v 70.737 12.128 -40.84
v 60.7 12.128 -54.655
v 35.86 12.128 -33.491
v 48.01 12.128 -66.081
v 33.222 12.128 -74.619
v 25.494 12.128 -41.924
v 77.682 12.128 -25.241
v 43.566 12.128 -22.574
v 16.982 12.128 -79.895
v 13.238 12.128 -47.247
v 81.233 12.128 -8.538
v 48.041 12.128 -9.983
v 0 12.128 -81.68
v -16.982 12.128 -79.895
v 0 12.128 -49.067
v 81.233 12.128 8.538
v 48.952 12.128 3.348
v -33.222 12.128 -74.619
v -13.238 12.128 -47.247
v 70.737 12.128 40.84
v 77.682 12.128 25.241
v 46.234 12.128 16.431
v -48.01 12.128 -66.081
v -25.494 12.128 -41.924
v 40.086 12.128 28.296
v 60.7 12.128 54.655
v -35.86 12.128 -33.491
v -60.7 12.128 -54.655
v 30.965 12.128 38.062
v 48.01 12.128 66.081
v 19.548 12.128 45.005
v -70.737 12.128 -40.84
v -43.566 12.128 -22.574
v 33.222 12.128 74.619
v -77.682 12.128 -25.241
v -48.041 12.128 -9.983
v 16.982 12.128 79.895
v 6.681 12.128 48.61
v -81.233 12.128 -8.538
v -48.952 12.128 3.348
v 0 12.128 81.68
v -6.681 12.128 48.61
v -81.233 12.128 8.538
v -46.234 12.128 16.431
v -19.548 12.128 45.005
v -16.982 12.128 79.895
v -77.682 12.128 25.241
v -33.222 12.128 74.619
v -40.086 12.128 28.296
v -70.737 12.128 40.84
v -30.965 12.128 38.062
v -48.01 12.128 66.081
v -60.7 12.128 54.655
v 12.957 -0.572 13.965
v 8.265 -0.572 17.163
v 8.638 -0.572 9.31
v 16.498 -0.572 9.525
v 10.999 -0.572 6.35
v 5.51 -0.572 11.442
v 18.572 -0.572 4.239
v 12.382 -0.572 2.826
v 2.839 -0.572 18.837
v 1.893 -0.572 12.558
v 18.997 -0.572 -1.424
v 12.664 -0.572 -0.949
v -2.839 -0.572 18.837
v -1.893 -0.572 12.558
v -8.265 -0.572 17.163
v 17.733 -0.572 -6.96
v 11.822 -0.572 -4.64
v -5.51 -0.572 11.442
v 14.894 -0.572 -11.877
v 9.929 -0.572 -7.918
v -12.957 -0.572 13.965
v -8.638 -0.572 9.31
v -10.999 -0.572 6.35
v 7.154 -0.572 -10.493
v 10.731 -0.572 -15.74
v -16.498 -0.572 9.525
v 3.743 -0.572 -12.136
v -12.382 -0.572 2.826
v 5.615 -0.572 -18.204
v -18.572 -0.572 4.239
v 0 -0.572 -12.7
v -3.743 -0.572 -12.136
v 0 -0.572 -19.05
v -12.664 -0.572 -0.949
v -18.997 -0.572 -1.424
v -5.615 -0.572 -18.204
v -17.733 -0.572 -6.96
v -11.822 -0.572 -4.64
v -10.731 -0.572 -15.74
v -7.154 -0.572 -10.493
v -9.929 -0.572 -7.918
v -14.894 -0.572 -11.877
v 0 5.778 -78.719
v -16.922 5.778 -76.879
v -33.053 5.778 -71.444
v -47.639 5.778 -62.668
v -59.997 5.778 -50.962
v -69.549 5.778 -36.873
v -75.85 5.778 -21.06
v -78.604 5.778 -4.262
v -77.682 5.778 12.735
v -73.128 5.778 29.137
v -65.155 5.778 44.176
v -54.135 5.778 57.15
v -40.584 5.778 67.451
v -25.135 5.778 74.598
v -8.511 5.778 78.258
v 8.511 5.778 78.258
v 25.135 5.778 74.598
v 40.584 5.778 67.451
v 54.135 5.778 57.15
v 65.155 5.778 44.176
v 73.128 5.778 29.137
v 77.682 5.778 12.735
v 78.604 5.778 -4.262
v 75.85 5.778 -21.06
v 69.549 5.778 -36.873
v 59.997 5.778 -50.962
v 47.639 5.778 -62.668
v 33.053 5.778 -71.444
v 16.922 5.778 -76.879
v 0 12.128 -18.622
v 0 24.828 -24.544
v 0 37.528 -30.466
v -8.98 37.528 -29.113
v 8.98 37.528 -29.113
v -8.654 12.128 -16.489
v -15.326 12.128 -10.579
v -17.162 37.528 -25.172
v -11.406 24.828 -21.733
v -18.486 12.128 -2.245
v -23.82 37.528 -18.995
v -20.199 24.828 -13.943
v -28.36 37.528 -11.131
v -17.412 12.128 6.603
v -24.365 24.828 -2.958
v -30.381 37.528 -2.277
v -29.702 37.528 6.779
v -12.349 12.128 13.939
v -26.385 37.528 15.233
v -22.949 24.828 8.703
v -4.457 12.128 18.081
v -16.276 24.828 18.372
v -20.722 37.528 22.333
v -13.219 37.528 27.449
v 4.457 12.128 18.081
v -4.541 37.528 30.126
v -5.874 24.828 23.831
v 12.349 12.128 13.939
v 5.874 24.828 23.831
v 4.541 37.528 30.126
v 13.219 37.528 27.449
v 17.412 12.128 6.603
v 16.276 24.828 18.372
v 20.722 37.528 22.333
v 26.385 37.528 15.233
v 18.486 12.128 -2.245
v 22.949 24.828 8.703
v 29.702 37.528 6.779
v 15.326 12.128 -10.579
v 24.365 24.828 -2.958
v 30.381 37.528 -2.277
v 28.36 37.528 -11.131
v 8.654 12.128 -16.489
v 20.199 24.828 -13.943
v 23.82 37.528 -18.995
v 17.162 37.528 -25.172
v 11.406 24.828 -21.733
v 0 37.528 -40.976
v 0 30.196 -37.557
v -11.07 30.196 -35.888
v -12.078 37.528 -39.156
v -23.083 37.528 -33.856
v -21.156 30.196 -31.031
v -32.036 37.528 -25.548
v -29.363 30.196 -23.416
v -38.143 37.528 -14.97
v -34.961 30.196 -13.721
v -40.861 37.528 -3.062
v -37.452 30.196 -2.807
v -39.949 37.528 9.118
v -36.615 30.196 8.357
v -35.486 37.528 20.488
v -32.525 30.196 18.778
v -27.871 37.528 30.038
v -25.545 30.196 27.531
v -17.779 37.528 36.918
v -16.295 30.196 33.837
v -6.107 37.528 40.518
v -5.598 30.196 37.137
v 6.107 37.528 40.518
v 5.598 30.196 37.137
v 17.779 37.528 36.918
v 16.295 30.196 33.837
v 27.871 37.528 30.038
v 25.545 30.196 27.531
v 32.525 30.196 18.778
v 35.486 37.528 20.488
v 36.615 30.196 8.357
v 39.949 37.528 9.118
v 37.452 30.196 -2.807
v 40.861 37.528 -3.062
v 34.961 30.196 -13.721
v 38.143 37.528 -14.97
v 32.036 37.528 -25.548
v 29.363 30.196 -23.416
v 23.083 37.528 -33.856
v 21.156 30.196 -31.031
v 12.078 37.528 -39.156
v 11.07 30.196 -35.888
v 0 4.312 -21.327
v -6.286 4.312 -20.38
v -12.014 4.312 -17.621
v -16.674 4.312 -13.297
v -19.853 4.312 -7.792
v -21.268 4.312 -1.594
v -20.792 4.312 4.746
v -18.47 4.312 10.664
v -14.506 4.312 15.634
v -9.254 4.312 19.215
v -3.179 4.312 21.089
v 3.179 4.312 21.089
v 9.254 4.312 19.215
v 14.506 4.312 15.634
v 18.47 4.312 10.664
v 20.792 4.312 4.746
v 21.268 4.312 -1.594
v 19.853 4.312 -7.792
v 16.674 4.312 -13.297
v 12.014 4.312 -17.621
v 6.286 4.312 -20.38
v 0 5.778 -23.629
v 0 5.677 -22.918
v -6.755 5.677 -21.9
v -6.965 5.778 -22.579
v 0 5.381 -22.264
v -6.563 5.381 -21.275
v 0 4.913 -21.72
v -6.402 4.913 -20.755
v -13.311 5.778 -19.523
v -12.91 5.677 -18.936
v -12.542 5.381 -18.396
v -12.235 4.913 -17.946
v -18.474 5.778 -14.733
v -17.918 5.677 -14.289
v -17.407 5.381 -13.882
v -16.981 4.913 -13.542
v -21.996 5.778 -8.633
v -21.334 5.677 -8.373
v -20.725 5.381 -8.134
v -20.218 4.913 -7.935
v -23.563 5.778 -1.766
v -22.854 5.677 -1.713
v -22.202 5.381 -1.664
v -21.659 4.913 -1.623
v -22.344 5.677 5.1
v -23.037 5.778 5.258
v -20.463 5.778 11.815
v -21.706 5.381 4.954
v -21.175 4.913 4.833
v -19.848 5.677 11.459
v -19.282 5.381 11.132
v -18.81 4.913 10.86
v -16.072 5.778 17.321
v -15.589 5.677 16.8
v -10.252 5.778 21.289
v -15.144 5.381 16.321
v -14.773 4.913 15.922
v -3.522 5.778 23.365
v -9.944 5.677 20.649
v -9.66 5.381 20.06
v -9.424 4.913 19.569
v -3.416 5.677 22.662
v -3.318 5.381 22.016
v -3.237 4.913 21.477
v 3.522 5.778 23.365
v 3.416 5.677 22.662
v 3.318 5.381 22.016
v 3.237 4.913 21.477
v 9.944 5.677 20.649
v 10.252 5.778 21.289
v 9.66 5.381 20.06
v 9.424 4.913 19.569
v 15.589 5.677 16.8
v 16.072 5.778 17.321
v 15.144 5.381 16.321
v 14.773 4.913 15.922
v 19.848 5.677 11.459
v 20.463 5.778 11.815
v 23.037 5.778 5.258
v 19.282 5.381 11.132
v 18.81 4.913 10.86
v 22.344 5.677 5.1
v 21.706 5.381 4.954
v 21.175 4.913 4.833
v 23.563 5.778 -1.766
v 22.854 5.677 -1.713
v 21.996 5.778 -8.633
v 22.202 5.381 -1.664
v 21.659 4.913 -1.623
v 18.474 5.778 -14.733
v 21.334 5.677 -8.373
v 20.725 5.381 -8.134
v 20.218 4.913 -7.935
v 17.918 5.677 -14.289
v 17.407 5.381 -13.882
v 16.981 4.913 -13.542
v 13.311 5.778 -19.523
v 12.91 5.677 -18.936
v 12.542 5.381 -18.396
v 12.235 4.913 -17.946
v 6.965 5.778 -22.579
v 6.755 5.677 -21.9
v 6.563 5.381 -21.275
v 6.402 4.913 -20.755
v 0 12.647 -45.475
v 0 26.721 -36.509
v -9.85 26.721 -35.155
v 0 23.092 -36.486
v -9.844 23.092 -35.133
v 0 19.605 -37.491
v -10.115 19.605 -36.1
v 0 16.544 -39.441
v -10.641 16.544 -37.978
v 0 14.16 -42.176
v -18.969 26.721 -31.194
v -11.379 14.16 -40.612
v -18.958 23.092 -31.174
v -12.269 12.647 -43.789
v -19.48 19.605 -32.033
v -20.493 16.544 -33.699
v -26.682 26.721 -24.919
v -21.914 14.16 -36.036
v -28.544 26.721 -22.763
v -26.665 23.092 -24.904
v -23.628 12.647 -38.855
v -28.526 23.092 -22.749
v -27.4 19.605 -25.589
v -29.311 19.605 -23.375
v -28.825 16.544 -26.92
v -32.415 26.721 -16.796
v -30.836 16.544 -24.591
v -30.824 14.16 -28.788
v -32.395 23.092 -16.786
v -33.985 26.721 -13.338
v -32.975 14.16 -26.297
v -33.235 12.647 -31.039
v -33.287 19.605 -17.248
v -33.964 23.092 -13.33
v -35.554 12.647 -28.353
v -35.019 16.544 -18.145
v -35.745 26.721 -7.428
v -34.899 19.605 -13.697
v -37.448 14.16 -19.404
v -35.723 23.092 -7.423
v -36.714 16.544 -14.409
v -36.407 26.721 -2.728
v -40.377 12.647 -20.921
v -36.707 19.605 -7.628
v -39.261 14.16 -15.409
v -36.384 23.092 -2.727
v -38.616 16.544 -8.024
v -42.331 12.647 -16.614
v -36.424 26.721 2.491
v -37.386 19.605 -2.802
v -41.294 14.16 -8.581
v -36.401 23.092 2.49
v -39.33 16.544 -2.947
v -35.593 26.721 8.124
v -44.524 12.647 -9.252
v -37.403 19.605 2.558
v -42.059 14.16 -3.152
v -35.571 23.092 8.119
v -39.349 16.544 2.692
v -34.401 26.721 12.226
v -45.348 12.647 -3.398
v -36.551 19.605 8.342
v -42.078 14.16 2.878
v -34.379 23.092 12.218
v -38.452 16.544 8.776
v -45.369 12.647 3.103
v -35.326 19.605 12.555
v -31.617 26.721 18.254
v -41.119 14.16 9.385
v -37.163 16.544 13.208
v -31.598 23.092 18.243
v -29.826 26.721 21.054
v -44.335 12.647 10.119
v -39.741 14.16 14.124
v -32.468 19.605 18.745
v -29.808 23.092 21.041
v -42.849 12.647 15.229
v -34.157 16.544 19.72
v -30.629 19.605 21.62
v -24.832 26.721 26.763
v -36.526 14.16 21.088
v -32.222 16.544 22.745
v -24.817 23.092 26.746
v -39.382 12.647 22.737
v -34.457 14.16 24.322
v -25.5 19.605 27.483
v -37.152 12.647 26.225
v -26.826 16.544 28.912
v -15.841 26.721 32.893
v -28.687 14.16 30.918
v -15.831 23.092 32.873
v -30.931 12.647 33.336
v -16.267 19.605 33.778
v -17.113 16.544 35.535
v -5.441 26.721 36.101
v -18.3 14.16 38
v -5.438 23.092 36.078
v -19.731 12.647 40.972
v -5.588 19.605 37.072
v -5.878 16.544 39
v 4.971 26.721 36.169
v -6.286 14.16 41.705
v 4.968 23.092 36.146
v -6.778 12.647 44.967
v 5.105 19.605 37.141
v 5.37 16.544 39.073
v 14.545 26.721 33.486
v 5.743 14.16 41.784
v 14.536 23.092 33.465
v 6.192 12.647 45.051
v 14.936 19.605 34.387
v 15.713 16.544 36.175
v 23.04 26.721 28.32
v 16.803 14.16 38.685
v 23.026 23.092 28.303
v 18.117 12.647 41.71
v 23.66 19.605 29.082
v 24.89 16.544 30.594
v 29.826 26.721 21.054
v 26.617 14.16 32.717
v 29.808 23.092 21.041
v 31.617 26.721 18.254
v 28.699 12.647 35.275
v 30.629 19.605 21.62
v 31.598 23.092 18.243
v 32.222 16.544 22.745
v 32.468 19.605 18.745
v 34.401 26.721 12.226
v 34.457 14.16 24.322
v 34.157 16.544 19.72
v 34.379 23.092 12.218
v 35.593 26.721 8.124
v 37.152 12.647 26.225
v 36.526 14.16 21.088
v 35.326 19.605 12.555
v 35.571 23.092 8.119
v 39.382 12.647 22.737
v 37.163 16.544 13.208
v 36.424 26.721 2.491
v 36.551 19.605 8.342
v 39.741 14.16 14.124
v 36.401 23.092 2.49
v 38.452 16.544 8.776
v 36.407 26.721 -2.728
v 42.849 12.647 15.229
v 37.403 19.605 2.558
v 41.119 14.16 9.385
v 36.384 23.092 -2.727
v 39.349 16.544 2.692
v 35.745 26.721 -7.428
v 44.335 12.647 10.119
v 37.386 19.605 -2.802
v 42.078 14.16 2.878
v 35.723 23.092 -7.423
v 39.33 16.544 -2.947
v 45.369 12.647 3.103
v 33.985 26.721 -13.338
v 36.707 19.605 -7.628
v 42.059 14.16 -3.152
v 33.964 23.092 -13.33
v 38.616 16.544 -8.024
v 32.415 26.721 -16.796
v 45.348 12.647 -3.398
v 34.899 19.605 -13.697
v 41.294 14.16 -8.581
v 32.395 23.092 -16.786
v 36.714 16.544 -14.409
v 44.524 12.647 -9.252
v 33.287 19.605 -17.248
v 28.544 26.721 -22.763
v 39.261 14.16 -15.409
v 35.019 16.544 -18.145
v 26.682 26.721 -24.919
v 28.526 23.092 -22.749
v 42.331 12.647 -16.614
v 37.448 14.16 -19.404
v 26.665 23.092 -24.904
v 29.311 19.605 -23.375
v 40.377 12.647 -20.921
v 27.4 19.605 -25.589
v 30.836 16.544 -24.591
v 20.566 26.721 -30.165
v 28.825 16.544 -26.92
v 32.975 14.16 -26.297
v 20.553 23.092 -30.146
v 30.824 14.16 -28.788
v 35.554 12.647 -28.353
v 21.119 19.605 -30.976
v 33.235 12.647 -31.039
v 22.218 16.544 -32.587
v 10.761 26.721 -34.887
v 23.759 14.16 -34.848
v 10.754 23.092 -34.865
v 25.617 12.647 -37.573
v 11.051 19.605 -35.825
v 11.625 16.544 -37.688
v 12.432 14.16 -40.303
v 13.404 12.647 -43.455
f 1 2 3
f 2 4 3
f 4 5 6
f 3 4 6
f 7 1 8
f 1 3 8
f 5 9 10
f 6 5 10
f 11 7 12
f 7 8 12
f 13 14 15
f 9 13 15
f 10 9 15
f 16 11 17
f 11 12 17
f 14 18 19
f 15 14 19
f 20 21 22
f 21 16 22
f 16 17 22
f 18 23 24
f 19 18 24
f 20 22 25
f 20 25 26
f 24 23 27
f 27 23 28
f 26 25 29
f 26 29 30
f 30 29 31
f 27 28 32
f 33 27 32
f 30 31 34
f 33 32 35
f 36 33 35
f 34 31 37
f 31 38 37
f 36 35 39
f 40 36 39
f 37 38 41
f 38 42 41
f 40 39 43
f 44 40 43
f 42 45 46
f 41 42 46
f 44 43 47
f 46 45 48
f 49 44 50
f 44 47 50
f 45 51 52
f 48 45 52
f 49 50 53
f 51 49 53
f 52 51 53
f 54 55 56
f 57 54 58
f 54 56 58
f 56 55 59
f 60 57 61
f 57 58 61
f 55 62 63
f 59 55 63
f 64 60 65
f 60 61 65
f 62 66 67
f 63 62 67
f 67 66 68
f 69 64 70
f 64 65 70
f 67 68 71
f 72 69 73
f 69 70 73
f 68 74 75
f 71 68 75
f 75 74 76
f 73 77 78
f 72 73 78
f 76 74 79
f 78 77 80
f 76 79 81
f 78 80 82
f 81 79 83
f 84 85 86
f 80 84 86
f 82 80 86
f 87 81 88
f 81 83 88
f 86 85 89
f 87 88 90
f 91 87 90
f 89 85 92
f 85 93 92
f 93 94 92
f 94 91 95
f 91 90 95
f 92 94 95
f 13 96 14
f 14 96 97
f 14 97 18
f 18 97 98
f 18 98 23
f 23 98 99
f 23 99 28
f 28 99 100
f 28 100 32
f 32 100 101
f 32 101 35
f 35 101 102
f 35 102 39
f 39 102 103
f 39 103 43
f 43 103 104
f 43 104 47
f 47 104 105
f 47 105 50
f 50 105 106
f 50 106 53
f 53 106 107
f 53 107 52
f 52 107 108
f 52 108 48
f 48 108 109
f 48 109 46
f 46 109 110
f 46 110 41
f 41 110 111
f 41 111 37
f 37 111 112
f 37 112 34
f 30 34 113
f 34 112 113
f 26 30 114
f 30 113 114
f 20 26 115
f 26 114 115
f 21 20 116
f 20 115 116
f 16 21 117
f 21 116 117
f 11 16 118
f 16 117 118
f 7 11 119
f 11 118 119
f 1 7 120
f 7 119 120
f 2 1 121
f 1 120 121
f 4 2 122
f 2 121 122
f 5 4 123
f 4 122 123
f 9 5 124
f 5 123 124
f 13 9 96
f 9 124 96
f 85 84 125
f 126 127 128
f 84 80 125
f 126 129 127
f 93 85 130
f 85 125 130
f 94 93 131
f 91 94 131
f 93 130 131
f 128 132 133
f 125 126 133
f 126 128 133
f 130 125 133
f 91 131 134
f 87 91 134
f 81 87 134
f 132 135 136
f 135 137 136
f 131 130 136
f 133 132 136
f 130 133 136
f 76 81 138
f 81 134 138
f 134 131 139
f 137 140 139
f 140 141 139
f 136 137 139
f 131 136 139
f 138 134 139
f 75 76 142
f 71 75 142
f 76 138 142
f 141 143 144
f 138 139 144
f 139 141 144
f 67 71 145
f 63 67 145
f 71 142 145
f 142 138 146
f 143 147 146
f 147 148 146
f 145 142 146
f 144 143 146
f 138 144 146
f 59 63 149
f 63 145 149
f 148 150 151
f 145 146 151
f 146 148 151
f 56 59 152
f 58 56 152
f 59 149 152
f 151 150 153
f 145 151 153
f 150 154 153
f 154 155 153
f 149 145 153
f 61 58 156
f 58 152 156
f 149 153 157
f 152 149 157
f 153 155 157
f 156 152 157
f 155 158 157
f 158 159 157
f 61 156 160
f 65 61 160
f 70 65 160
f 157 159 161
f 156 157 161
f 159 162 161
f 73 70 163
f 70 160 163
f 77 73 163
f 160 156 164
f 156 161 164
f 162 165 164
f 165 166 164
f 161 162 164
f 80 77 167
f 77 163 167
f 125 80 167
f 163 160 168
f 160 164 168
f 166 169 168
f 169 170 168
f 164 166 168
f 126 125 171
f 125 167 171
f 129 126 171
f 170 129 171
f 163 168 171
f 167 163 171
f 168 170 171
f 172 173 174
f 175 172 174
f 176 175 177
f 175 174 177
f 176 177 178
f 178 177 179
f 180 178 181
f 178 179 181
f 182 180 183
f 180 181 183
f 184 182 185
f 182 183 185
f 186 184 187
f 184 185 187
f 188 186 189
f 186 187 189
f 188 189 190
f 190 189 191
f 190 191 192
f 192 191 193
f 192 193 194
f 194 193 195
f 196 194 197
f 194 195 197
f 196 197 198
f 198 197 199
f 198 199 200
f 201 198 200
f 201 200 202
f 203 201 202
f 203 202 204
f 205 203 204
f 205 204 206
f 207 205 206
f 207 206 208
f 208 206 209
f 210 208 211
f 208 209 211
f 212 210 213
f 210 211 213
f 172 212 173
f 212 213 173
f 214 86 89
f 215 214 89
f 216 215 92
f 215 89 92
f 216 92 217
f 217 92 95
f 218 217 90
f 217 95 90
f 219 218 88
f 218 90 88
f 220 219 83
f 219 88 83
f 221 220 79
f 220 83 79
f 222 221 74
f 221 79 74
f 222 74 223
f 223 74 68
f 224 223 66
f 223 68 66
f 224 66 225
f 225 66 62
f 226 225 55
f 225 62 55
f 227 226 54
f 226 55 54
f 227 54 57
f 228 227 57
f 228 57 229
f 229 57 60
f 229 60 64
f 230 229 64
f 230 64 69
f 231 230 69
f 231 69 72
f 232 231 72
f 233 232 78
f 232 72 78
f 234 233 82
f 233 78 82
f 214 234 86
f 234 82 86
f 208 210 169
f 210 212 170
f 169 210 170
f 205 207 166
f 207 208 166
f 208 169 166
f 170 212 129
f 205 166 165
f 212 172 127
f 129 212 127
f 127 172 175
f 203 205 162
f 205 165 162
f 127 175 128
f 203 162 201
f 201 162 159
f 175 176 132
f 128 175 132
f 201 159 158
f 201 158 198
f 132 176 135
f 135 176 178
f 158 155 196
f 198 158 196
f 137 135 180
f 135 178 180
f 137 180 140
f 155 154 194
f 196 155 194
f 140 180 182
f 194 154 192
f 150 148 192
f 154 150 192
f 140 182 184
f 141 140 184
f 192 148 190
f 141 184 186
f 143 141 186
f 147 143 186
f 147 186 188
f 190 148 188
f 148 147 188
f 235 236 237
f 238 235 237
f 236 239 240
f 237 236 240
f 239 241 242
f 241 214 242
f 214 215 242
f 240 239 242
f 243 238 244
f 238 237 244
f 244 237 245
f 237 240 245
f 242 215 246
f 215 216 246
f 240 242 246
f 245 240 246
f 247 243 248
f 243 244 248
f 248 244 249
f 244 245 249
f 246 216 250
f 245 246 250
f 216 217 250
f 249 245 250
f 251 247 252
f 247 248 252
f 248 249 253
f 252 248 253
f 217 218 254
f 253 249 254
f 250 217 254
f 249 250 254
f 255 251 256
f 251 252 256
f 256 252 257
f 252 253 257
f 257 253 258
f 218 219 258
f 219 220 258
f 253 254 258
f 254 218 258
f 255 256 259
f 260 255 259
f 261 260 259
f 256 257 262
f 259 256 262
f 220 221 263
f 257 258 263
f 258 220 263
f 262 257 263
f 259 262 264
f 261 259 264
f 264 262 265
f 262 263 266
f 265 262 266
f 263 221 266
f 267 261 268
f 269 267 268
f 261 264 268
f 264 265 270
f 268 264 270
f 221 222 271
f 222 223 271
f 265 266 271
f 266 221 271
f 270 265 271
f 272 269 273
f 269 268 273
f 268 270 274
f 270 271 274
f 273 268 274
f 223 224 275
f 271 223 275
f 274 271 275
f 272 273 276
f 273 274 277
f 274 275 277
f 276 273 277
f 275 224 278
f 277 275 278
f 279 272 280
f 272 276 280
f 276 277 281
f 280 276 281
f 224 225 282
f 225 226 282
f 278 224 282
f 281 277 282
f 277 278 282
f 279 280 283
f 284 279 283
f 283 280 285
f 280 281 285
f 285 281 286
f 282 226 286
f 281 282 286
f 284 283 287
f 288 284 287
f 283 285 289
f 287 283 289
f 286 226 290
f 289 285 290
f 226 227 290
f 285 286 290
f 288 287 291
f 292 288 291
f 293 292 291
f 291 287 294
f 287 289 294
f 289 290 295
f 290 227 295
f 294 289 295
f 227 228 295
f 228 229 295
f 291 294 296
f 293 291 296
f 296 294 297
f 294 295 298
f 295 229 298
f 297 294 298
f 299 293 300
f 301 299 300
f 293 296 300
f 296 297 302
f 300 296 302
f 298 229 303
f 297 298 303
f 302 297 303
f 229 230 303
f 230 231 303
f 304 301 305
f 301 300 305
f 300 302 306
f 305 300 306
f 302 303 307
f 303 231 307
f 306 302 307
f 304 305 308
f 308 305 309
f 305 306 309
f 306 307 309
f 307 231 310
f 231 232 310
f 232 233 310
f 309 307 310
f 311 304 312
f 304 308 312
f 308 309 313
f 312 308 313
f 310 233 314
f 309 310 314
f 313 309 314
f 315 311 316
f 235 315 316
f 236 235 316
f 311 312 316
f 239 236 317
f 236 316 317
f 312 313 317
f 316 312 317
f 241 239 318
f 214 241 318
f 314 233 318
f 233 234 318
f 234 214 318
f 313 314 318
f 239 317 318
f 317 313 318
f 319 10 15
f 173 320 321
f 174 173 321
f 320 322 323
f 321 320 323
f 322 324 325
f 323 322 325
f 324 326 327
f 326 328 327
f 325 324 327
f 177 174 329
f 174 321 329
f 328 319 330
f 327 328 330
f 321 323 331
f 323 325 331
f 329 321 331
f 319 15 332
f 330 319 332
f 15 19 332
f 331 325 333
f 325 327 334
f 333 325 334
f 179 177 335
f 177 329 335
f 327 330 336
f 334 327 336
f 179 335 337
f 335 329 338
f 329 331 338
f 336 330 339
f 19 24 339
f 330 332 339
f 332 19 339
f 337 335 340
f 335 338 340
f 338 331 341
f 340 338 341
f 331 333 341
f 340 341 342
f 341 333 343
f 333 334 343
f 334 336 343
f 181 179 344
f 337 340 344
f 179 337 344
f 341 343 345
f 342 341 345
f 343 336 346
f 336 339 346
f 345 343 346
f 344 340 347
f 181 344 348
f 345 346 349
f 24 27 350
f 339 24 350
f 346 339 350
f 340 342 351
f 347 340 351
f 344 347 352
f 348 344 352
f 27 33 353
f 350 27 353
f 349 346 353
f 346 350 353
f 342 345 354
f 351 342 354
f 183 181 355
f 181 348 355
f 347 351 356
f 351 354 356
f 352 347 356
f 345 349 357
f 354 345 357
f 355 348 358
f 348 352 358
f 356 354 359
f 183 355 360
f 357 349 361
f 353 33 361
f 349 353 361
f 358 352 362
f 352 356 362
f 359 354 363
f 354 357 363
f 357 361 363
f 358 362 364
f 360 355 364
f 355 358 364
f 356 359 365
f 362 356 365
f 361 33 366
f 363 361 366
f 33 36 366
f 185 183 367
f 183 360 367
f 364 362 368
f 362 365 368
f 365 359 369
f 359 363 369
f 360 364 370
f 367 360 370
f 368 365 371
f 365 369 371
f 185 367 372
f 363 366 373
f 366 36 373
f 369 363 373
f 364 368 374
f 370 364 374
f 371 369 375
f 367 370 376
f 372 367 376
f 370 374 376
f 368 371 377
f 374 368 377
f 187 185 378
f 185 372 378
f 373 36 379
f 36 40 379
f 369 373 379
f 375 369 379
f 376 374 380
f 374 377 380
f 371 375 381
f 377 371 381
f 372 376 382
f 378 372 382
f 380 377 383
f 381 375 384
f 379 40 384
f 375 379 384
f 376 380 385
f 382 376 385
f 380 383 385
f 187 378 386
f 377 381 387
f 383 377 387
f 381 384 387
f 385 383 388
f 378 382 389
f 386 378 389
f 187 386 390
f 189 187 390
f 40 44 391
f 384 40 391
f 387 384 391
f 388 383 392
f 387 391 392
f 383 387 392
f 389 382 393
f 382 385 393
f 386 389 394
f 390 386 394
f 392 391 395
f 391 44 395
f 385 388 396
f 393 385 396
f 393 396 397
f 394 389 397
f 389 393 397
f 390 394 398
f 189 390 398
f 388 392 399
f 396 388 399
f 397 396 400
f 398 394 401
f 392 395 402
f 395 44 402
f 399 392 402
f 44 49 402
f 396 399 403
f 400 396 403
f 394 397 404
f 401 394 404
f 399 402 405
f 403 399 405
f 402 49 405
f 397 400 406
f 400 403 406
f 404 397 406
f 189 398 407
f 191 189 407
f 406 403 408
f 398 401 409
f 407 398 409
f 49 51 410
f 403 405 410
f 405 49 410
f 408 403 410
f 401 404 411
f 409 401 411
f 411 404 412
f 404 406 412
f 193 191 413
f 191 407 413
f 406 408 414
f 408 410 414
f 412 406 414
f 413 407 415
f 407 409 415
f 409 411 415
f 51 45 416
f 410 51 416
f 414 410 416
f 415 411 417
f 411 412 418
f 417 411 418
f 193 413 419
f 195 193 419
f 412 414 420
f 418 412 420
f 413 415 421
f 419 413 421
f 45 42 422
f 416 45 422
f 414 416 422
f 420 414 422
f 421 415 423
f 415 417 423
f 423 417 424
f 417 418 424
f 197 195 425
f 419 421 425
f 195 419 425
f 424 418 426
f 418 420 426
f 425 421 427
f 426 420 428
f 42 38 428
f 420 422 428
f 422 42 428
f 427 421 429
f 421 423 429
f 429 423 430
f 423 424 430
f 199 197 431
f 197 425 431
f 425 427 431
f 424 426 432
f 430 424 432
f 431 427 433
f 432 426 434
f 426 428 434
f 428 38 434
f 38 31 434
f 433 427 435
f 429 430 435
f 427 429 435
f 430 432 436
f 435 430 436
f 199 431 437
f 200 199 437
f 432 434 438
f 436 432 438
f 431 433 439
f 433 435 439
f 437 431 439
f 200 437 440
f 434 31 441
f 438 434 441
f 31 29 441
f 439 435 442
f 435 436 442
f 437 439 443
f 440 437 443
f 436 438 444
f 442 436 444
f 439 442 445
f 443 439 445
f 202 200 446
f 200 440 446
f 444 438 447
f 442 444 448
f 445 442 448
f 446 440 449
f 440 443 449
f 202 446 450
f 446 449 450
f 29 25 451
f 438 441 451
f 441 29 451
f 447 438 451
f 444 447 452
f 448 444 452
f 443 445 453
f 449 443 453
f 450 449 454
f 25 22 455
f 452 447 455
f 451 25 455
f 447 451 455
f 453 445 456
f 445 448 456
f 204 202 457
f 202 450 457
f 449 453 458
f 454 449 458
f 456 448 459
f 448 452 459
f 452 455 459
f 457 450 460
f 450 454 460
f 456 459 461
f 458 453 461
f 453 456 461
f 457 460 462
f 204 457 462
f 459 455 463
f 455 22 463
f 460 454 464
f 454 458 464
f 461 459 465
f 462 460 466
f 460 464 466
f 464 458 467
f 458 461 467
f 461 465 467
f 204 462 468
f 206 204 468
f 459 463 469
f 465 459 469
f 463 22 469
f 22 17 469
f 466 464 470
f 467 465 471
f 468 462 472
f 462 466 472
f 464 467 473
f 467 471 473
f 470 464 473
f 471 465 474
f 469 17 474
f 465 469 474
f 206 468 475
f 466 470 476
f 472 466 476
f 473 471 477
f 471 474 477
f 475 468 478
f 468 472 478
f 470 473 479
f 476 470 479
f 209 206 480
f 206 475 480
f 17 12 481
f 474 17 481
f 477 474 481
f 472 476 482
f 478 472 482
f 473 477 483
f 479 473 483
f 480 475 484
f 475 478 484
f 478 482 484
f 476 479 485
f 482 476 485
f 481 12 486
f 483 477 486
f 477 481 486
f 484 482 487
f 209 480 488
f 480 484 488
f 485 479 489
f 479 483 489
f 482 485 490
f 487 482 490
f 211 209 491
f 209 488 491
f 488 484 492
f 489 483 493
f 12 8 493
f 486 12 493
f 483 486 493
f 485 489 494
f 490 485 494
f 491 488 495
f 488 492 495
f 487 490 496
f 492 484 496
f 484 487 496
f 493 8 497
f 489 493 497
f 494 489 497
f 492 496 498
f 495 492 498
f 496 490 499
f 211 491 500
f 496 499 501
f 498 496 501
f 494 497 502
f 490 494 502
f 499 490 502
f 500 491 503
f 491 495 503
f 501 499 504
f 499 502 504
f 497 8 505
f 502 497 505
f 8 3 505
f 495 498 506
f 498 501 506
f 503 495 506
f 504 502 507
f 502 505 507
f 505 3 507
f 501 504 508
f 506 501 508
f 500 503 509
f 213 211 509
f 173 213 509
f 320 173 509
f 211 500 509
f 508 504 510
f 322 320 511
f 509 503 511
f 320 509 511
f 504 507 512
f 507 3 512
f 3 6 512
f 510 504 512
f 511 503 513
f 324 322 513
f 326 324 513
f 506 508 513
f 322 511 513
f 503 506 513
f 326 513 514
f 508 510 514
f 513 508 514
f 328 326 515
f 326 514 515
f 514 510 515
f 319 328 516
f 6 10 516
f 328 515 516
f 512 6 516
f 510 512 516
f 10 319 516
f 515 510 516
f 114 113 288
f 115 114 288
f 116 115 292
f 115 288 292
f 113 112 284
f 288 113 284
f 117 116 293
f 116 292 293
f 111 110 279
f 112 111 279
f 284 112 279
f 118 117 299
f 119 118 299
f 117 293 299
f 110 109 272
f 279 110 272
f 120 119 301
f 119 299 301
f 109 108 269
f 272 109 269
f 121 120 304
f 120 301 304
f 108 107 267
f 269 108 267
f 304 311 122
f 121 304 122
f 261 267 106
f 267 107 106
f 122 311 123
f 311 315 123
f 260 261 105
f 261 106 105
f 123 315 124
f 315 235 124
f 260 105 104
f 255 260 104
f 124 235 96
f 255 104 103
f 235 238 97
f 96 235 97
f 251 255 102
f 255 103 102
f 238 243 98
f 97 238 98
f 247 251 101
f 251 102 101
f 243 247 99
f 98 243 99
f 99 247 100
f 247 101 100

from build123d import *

# Parameters (mm, degrees)
FILLET2_R = 12.7
FILLET3_R = 2.54


with BuildPart() as part:
    # Sketch1 → Revolve2 (revolve)
    with BuildSketch(Plane.XY, mode=Mode.PRIVATE) as revolve2_sk:
        Polygon((-12.7, -0.571707157), (-30.466321776, 37.528292843), (-40.975996454, 37.528292843), (-29.131781937, 12.128292843), (-50.190671319, 12.128292843), (-81.680155327, 12.128292843), (-78.719101698, 5.778292843), (-22.011053629, 5.778292843), (-19.05, -0.571707157), align=None)
    revolve(revolve2_sk.sketch.rotate(Axis((0, 0, 0), (0, 1, 0)), 270), axis=Axis((0, 0, 0), (0, 1, 0)))

    # Fillet2
    fillet2_edges = [part.edges().sort_by_distance(p)[0] for p in [
        (0, 12.128292843, 29.131781937),
    ]]
    fillet(fillet2_edges, radius=FILLET2_R)

    # Fillet3
    fillet3_edges = [part.edges().sort_by_distance(p)[0] for p in [
        (0, 5.778292843, 22.011053629),
    ]]
    fillet(fillet3_edges, radius=FILLET3_R)


solid = part.part
